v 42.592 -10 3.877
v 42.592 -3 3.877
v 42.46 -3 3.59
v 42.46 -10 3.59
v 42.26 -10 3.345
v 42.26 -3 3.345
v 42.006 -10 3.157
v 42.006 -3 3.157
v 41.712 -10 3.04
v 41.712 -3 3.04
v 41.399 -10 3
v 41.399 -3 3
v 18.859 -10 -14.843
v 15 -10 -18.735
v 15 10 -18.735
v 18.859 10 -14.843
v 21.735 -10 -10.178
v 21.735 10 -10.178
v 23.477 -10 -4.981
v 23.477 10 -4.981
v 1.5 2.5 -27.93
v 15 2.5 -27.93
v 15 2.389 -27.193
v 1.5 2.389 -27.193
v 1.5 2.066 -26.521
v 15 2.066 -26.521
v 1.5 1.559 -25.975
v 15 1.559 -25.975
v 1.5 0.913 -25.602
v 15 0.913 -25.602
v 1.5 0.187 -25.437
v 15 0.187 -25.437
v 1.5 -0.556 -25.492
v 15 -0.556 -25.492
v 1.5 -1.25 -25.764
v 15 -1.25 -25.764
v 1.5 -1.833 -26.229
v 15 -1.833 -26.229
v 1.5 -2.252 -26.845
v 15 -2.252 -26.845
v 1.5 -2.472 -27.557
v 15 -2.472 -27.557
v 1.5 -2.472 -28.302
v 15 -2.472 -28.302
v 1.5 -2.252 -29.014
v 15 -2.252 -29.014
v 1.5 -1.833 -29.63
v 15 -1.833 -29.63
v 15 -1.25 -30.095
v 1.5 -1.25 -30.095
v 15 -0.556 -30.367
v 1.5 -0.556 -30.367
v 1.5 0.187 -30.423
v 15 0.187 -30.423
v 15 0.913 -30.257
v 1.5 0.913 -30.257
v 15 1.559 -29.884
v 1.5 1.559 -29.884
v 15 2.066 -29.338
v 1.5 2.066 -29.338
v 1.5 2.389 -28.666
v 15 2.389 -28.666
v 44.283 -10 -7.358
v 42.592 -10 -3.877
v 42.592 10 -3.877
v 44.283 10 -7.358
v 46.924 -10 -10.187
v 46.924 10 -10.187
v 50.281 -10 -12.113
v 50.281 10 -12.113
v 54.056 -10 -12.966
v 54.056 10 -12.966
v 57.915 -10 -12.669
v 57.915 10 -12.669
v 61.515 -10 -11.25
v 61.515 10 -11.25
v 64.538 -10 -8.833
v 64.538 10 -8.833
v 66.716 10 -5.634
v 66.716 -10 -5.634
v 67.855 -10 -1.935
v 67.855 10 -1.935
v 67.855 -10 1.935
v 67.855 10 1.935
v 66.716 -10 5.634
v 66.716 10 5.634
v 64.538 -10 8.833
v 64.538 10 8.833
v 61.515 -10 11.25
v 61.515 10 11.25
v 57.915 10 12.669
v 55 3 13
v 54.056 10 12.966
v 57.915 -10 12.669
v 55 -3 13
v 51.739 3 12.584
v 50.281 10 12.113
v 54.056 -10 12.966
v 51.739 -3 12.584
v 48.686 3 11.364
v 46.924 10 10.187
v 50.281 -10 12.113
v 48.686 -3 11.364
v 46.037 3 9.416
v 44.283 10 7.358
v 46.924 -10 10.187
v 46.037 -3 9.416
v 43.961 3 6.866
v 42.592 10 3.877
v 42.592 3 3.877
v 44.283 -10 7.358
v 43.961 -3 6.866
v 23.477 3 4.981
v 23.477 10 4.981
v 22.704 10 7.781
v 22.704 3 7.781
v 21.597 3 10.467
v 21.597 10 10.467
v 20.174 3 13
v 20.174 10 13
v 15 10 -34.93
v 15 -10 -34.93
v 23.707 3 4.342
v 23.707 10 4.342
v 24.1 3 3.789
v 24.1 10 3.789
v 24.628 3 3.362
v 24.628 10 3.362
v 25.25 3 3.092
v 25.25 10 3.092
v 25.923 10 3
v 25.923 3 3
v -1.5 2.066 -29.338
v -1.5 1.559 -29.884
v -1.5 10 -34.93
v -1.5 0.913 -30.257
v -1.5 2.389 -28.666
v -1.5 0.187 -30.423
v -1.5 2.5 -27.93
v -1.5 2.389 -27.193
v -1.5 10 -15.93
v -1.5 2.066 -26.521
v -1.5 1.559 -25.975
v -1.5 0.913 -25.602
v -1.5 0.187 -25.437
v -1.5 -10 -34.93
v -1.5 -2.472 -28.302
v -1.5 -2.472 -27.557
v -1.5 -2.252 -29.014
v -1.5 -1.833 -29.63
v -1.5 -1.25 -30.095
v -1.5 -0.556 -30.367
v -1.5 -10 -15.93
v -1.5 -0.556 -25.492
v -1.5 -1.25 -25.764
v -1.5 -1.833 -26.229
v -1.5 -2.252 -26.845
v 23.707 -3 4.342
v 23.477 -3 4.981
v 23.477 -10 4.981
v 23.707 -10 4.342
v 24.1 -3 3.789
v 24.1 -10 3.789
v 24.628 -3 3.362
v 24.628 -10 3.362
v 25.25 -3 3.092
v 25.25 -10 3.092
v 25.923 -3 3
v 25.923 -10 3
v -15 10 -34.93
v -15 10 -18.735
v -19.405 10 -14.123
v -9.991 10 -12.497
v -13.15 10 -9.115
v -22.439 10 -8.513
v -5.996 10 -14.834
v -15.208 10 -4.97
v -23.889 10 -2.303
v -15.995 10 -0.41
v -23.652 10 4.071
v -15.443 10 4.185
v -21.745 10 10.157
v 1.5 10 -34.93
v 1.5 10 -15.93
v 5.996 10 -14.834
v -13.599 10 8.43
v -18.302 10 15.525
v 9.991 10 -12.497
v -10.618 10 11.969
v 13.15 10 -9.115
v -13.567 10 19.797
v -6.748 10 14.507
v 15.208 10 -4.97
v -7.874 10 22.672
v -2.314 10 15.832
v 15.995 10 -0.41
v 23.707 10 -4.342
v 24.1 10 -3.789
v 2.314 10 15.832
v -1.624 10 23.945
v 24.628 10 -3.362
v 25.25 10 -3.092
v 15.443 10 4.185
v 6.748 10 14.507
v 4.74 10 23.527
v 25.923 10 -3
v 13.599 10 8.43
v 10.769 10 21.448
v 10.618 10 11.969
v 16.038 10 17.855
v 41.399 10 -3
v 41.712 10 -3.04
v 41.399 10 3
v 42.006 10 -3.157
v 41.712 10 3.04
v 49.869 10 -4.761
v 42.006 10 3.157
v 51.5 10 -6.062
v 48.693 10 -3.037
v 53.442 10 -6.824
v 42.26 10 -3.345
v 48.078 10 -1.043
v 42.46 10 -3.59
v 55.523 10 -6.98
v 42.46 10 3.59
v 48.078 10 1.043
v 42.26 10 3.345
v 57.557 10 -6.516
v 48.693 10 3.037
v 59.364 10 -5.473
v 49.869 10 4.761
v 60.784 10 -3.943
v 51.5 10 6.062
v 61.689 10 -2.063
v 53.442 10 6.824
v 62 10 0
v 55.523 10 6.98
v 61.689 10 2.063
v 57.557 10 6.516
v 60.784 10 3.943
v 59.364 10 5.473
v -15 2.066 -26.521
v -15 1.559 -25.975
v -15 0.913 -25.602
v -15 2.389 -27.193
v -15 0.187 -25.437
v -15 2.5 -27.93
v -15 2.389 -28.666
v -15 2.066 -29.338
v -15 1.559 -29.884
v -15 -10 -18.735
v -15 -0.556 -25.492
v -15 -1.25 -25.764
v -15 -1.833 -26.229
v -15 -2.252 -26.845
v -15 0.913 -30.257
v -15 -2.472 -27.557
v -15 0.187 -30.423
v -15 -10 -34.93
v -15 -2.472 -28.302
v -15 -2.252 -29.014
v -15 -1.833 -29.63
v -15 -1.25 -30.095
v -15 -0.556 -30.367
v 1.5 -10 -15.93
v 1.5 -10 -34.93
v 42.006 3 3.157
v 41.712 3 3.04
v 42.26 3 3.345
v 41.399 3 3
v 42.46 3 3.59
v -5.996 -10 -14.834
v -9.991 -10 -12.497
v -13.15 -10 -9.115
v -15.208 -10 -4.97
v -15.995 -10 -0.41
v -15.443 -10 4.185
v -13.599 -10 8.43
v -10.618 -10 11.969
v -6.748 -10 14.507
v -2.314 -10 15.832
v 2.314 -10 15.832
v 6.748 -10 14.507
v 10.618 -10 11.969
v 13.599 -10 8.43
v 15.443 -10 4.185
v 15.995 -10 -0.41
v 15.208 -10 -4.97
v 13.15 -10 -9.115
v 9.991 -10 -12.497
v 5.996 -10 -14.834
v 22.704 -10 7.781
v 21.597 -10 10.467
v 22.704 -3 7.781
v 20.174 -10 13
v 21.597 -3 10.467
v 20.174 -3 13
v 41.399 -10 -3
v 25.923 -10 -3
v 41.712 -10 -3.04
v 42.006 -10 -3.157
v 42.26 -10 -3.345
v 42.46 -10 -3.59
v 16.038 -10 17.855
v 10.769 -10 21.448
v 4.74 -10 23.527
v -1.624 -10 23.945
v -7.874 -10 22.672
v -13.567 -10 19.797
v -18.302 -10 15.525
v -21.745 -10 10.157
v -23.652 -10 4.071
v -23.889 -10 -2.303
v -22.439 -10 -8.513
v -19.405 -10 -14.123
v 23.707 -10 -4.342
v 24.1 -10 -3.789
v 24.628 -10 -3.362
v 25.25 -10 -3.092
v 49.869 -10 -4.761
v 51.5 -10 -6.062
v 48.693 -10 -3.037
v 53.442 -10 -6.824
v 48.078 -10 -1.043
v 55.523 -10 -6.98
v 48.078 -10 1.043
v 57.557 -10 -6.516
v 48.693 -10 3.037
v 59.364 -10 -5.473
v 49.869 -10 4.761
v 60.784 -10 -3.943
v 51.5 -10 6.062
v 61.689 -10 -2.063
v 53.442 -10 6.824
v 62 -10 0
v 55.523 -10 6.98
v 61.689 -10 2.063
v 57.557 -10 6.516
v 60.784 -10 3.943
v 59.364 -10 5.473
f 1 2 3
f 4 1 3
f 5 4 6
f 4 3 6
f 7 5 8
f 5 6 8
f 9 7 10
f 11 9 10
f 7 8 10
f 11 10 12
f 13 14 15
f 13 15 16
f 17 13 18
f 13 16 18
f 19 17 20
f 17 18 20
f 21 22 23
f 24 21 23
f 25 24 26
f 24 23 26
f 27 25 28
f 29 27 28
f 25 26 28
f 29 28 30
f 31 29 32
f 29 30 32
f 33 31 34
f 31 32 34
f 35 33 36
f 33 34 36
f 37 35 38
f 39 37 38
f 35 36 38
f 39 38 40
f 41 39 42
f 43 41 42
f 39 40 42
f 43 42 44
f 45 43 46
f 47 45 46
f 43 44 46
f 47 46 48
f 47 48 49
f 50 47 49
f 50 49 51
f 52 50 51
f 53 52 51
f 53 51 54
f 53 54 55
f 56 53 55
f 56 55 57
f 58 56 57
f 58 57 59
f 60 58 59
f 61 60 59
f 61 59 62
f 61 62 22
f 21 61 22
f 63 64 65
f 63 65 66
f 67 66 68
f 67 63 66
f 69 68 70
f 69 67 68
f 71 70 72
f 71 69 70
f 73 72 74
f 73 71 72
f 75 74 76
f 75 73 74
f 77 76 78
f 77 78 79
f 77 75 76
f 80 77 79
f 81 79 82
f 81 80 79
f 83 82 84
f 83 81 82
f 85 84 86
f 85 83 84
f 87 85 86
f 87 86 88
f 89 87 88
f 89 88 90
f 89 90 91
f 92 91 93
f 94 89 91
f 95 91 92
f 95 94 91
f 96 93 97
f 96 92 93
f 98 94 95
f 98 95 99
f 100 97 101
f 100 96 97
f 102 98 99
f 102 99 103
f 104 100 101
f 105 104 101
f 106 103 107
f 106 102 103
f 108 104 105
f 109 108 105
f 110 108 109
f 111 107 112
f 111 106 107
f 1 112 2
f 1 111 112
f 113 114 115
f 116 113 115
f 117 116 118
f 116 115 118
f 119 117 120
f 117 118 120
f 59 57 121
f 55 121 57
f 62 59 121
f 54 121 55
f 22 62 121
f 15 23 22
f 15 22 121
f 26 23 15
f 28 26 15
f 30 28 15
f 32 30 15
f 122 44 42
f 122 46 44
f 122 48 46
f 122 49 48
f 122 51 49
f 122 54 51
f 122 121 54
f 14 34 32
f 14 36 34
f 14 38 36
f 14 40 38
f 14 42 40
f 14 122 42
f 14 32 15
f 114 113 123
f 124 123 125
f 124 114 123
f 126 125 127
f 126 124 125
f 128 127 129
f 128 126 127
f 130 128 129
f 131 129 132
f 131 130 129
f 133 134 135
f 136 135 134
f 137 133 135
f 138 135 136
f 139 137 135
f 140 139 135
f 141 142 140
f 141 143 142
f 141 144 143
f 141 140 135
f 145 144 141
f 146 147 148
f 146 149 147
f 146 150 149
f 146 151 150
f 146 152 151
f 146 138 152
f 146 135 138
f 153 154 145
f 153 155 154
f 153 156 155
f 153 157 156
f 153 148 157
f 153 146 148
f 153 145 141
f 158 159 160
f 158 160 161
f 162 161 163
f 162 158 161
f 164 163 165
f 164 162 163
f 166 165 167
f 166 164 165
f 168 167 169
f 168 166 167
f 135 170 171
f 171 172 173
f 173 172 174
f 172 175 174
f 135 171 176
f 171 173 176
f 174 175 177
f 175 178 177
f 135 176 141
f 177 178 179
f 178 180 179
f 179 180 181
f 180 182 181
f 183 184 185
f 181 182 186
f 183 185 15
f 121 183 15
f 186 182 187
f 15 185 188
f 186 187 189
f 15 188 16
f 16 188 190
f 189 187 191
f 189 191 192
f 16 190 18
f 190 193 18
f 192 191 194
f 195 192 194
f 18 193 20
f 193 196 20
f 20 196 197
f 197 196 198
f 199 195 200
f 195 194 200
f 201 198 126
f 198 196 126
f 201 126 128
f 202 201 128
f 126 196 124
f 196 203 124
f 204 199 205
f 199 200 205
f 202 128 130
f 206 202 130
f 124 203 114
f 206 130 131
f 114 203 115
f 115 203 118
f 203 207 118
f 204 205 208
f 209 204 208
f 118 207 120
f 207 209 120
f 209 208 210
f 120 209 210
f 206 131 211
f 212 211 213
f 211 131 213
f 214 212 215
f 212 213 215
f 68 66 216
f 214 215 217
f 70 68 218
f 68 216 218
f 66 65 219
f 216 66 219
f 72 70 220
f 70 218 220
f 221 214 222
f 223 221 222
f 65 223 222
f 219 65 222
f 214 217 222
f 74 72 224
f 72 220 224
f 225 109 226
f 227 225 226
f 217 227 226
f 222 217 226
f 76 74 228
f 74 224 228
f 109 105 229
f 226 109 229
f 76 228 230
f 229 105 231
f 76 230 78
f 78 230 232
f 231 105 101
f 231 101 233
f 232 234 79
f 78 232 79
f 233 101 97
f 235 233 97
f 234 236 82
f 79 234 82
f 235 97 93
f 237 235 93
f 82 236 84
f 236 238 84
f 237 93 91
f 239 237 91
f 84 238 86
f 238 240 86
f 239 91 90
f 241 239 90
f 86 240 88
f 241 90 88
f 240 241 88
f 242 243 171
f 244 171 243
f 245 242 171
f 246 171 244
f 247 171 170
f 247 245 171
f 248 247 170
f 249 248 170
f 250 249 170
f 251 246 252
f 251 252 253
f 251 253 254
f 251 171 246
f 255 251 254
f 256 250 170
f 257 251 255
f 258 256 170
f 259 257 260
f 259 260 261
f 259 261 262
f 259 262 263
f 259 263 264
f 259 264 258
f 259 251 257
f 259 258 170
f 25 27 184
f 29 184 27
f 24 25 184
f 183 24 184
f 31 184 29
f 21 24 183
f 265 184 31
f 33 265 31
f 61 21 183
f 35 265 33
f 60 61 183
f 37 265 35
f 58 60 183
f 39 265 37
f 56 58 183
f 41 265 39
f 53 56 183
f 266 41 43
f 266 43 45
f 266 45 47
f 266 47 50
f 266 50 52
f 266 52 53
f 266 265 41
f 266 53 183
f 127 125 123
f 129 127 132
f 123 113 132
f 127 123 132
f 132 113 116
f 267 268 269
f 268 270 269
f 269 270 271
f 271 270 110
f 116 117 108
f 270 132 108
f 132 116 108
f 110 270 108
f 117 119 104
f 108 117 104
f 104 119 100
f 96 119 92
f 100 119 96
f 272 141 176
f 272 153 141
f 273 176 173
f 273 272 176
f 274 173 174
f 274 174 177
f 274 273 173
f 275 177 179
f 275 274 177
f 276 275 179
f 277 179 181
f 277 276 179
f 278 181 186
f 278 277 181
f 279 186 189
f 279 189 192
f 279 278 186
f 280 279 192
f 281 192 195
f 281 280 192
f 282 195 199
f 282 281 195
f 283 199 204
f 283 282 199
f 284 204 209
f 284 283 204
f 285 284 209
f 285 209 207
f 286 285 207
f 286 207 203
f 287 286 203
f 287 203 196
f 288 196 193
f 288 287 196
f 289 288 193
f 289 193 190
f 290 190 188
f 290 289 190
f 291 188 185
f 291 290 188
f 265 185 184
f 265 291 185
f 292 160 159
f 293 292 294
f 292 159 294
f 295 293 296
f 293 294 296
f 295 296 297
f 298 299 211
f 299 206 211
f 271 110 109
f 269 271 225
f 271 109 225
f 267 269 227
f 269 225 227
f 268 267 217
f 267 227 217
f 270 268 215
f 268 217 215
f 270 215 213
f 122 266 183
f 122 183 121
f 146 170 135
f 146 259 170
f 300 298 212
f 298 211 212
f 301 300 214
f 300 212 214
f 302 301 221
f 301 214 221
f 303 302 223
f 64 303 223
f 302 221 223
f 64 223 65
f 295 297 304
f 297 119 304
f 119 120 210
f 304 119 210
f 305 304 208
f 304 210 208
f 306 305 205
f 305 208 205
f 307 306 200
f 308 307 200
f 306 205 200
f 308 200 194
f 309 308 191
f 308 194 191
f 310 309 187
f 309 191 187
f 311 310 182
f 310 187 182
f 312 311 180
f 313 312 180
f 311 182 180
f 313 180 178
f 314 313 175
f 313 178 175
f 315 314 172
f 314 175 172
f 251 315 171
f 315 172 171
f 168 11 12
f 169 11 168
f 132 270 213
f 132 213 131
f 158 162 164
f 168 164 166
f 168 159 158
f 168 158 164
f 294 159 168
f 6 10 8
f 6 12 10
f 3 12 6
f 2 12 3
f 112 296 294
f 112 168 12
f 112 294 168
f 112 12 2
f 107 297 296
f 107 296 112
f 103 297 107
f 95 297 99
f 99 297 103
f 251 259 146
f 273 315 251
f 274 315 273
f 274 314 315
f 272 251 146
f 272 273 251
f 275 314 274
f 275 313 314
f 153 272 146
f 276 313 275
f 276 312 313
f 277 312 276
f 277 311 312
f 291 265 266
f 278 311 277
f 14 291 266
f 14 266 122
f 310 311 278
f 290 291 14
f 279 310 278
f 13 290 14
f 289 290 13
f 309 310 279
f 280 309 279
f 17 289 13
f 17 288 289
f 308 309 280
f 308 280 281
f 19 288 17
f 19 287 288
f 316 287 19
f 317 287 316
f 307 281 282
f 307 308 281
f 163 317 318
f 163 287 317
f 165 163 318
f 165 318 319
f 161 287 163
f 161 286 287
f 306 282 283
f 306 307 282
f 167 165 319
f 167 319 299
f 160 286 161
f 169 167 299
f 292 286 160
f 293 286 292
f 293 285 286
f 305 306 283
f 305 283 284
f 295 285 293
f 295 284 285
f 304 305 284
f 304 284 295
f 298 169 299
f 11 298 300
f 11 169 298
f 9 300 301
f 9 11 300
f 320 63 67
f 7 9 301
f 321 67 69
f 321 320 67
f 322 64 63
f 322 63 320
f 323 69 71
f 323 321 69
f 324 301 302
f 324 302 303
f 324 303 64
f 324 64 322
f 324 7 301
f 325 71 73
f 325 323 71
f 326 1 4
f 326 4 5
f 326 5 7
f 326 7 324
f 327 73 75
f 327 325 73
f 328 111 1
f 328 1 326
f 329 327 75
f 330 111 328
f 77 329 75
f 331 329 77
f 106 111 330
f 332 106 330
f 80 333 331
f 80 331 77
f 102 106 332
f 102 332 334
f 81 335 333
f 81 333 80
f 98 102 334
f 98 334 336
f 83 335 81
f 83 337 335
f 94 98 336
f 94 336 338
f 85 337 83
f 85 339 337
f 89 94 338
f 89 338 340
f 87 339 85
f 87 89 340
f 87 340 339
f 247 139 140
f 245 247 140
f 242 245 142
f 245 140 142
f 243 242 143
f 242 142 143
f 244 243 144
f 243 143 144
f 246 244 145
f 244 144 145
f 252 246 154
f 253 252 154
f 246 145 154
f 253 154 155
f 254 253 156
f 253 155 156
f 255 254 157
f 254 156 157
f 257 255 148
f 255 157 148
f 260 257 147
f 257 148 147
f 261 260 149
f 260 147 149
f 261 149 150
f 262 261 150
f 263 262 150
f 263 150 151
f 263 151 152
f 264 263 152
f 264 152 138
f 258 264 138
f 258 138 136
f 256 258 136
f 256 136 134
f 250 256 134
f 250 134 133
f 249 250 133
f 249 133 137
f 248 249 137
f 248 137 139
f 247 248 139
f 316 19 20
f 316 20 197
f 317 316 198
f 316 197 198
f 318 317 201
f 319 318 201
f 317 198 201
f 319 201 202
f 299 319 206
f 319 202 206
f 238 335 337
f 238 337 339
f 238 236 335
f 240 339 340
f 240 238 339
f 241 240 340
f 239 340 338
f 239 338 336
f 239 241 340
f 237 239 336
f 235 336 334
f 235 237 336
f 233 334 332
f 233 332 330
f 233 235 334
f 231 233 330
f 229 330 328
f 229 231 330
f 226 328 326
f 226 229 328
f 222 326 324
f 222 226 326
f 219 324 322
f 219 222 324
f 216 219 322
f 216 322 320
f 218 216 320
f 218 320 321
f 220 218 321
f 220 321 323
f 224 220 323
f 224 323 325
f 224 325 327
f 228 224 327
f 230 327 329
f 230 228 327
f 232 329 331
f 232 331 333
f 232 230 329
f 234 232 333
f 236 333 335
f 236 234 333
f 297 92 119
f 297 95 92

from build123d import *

# Parameters (mm, degrees)
F0_R     = 7
F1_DEPTH = 10
F2_R     = 2.5
F3_DEPTH = 39.001
F4_R     = 2.5
F5_R     = 1.25
F6_DEPTH = 3


with BuildPart() as f1:
    # F0 (on Front) → F1 (new body, symmetric)
    with BuildSketch(Plane.XZ):
        with BuildLine():
            ThreePointArc((-1.5, -15.9295323221), (0, 16), (1.5, -15.9295323221))
            Line((1.5, -15.9295323221), (1.5, -34.9295323221))
            Line((1.5, -34.9295323221), (15, -34.9295323221))
            Line((15, -34.9295323221), (15, -18.7349939952))
            ThreePointArc((15, -18.7349939952), (20.9400506806, -11.7266481782), (23.8117617996, -3))
            Line((23.8117617996, -3), (42.3508893593, -3))
            ThreePointArc((42.3508893593, -3), (65.1980390272, -8.0622577483), (55, 13))
            ThreePointArc((55, 13), (46.9377422517, 10.1980390272), (42.3508893593, 3))
            Line((42.3508893593, 3), (23.8117617996, 3))
            ThreePointArc((23.8117617996, 3), (22.5542038346, 8.2041385525), (20.1742410018, 13))
            ThreePointArc((20.1742410018, 13), (-16.0770225308, 17.8193531461), (-15, -18.7349939952))
            Line((-15, -18.7349939952), (-15, -34.9295323221))
            Line((-15, -34.9295323221), (-1.5, -34.9295323221))
            Line((-1.5, -34.9295323221), (-1.5, -15.9295323221))
        make_face()
        with Locations((55, 0)):
            Circle(F0_R, mode=Mode.SUBTRACT)
    extrude(amount=F1_DEPTH, both=True)

    # F2 (on face) → F3 (cut, through all)
    with BuildSketch(Plane.YZ.offset(15)):
        with Locations((0, -27.9295323221)):
            Circle(F2_R)
    extrude(amount=-F3_DEPTH, mode=Mode.SUBTRACT)

    # F4
    f4_edges = [f1.edges().sort_by_distance(p)[0] for p in [
        (23.811762, 5, 3),
        (23.811762, -5, 3),
        (23.811762, 5, -3),
        (23.811762, -5, -3),
    ]]
    fillet(f4_edges, radius=F4_R)

    # F5
    f5_edges = [f1.edges().sort_by_distance(p)[0] for p in [
        (42.350889, 5, -3),
        (42.350889, -5, -3),
        (42.350889, 5, 3),
        (42.350889, -5, 3),
    ]]
    fillet(f5_edges, radius=F5_R)

    # F0 (on Front) → F6 (join, symmetric)
    with BuildSketch(Plane.XZ):
        with BuildLine():
            Line((55, 13), (20.1742410018, 13))
            ThreePointArc((20.1742410018, 13), (22.5542038346, 8.2041385525), (23.8117617996, 3))
            Line((23.8117617996, 3), (42.3508893593, 3))
            ThreePointArc((42.3508893593, 3), (46.9377422517, 10.1980390272), (55, 13))
        make_face()
    extrude(amount=F6_DEPTH, both=True)


solid = f1.part
